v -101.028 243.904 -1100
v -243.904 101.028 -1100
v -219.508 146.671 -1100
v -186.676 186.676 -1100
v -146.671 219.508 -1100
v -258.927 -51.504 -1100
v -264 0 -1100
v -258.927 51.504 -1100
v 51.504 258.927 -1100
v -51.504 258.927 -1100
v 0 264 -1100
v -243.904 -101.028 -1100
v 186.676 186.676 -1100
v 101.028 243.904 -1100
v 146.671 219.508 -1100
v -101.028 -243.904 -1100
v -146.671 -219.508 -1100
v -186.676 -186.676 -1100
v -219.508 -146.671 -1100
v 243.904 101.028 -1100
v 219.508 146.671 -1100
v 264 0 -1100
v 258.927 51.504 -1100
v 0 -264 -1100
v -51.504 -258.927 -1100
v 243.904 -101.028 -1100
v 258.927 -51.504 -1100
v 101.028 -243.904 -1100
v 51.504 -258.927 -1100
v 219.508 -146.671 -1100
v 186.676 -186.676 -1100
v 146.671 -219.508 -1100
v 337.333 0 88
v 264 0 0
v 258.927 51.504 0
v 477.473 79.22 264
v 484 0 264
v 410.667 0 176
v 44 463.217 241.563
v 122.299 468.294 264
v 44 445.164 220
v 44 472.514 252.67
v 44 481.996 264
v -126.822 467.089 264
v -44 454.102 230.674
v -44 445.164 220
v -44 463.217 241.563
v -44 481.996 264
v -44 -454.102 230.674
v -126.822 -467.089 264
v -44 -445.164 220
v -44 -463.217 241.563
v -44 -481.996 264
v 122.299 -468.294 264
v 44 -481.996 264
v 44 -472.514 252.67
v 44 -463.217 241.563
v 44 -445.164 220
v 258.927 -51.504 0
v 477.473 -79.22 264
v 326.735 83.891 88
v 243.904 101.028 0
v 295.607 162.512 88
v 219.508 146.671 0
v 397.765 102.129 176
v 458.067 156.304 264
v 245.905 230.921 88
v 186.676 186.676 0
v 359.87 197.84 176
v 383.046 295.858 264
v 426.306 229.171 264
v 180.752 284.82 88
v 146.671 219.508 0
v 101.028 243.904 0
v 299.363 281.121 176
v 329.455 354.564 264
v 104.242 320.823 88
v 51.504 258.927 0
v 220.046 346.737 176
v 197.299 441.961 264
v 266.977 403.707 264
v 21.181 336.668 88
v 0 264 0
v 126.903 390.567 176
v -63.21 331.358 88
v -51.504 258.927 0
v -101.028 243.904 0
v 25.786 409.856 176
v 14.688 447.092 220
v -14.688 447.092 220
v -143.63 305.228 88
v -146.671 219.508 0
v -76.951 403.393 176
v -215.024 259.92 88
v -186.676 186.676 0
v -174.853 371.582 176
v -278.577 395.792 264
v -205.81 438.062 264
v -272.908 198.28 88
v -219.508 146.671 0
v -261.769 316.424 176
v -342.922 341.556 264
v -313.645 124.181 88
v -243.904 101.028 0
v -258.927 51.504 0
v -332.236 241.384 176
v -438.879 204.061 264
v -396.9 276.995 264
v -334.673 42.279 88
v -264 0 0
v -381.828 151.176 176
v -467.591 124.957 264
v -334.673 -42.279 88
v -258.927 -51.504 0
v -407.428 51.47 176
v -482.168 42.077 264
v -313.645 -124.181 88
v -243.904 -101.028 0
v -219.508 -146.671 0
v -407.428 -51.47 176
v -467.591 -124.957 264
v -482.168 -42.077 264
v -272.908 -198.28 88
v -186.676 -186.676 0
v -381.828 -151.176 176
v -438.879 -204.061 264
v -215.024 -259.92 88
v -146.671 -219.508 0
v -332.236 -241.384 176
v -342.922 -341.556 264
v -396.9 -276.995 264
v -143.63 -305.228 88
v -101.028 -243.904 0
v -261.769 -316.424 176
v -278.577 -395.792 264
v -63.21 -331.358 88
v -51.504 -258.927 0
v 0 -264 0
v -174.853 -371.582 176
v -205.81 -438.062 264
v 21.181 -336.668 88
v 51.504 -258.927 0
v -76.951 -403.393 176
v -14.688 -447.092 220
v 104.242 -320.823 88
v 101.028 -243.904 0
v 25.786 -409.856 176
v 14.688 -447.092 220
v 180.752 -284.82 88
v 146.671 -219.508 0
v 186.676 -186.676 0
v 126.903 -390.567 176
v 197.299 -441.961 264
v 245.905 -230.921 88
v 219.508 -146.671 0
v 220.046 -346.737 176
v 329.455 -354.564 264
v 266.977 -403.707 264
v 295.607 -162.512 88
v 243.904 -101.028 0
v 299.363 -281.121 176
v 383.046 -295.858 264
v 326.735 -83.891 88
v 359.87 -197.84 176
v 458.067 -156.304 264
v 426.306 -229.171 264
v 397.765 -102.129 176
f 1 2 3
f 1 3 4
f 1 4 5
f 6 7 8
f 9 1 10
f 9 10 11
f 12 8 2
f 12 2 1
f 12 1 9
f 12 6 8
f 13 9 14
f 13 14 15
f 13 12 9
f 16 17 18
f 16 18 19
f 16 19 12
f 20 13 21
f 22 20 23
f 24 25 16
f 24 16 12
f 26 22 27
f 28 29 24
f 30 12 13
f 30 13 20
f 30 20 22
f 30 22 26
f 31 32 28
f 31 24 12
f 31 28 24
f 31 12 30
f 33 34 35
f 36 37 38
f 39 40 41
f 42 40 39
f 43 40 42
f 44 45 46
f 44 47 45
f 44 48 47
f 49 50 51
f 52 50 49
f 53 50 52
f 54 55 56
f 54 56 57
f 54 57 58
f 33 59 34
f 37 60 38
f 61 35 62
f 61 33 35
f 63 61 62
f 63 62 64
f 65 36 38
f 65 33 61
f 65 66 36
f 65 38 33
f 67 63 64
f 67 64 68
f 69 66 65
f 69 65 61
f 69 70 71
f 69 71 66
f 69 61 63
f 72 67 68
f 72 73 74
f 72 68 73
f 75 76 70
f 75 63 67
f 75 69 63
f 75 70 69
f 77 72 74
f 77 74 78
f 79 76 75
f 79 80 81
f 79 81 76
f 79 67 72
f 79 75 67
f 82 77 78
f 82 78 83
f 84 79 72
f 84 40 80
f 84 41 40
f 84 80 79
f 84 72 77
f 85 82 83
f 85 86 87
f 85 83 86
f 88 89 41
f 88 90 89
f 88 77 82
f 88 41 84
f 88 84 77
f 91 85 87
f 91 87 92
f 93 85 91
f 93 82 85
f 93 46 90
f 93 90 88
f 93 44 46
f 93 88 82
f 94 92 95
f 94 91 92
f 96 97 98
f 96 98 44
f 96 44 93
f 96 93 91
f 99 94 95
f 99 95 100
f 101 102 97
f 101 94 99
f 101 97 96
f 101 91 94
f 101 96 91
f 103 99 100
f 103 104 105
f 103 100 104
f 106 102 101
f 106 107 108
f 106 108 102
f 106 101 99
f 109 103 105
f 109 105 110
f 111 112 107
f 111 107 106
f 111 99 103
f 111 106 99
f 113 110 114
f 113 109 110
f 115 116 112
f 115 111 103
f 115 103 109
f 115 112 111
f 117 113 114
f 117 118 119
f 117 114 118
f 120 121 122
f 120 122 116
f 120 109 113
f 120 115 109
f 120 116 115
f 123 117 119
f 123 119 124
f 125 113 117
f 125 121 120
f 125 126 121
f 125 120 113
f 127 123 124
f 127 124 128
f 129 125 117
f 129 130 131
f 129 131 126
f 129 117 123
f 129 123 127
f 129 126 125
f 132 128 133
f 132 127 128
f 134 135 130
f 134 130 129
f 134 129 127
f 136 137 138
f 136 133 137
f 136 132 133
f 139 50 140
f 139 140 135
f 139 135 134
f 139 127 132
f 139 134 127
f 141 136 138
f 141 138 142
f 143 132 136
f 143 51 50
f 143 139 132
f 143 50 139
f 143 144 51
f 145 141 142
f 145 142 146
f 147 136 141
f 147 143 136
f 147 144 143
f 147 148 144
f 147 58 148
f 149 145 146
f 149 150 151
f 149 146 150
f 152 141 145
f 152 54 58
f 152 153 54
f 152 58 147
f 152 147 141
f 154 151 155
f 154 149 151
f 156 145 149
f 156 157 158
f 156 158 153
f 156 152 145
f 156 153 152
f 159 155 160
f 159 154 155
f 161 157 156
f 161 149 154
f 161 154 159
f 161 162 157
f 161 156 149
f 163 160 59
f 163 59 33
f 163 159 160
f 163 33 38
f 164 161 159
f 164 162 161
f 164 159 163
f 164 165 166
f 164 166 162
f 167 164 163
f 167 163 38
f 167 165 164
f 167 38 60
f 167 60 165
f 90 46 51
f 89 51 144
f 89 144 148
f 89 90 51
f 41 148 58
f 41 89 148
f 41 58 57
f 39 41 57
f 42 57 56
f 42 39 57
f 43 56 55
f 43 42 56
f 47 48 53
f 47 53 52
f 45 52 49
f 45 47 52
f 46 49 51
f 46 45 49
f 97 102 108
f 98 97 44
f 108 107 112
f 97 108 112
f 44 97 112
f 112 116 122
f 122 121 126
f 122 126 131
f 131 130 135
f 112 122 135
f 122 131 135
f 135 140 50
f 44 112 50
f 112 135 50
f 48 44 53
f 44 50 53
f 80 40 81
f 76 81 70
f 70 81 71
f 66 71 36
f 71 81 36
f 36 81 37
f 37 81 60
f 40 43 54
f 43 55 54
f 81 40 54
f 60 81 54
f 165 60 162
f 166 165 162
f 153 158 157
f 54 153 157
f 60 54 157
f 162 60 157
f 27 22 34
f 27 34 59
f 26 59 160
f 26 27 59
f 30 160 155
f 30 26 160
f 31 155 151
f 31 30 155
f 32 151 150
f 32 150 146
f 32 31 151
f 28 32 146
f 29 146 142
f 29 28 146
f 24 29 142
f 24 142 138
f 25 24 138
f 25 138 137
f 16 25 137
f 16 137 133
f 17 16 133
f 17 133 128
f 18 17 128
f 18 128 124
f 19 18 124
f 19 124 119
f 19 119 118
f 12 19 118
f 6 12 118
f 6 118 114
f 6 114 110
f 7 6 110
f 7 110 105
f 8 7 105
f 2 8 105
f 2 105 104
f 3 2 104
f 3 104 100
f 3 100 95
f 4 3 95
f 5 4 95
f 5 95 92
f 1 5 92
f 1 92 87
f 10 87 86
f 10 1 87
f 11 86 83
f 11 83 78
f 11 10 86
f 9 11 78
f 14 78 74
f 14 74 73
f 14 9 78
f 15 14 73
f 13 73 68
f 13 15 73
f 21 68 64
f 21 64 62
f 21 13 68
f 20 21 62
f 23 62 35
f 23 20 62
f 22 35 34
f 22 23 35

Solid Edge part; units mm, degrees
sketch "Sketch1" plane through (0, 0, 0) normal (0, -1, 0) x (1, 0, 0)
  line L0 (264, 0) -> (264, -1100)
  line L1 (264, -1100) -> (0, -1100)
  line L2 (0, 0) -> (0, -1100)
  line L3 (0, 0) -> (0, 264)
  line L4 (0, 264) -> (484, 264)
  line L5 (264, 0) -> (484, 264)
revolve "RevolvedProtrusion1" add sketch "Sketch1" angle 360 about axis through (0, 0, 0) along (0, 0, -1)
sketch "Sketch2" plane through (0, 0, 0) normal (0, -1, 0) x (1, 0, 0)
  line L0 (-44, 264) -> (-44, 220)
  line L1 (-44, 220) -> (44, 220)
  line L2 (44, 220) -> (44, 264)
  line L3 (44, 264) -> (0, 264)
  line L4 (0, 264) -> (-44, 264)
extrude "Cutout1" cut sketch "Sketch2" along normal up to next and the other way up to next
